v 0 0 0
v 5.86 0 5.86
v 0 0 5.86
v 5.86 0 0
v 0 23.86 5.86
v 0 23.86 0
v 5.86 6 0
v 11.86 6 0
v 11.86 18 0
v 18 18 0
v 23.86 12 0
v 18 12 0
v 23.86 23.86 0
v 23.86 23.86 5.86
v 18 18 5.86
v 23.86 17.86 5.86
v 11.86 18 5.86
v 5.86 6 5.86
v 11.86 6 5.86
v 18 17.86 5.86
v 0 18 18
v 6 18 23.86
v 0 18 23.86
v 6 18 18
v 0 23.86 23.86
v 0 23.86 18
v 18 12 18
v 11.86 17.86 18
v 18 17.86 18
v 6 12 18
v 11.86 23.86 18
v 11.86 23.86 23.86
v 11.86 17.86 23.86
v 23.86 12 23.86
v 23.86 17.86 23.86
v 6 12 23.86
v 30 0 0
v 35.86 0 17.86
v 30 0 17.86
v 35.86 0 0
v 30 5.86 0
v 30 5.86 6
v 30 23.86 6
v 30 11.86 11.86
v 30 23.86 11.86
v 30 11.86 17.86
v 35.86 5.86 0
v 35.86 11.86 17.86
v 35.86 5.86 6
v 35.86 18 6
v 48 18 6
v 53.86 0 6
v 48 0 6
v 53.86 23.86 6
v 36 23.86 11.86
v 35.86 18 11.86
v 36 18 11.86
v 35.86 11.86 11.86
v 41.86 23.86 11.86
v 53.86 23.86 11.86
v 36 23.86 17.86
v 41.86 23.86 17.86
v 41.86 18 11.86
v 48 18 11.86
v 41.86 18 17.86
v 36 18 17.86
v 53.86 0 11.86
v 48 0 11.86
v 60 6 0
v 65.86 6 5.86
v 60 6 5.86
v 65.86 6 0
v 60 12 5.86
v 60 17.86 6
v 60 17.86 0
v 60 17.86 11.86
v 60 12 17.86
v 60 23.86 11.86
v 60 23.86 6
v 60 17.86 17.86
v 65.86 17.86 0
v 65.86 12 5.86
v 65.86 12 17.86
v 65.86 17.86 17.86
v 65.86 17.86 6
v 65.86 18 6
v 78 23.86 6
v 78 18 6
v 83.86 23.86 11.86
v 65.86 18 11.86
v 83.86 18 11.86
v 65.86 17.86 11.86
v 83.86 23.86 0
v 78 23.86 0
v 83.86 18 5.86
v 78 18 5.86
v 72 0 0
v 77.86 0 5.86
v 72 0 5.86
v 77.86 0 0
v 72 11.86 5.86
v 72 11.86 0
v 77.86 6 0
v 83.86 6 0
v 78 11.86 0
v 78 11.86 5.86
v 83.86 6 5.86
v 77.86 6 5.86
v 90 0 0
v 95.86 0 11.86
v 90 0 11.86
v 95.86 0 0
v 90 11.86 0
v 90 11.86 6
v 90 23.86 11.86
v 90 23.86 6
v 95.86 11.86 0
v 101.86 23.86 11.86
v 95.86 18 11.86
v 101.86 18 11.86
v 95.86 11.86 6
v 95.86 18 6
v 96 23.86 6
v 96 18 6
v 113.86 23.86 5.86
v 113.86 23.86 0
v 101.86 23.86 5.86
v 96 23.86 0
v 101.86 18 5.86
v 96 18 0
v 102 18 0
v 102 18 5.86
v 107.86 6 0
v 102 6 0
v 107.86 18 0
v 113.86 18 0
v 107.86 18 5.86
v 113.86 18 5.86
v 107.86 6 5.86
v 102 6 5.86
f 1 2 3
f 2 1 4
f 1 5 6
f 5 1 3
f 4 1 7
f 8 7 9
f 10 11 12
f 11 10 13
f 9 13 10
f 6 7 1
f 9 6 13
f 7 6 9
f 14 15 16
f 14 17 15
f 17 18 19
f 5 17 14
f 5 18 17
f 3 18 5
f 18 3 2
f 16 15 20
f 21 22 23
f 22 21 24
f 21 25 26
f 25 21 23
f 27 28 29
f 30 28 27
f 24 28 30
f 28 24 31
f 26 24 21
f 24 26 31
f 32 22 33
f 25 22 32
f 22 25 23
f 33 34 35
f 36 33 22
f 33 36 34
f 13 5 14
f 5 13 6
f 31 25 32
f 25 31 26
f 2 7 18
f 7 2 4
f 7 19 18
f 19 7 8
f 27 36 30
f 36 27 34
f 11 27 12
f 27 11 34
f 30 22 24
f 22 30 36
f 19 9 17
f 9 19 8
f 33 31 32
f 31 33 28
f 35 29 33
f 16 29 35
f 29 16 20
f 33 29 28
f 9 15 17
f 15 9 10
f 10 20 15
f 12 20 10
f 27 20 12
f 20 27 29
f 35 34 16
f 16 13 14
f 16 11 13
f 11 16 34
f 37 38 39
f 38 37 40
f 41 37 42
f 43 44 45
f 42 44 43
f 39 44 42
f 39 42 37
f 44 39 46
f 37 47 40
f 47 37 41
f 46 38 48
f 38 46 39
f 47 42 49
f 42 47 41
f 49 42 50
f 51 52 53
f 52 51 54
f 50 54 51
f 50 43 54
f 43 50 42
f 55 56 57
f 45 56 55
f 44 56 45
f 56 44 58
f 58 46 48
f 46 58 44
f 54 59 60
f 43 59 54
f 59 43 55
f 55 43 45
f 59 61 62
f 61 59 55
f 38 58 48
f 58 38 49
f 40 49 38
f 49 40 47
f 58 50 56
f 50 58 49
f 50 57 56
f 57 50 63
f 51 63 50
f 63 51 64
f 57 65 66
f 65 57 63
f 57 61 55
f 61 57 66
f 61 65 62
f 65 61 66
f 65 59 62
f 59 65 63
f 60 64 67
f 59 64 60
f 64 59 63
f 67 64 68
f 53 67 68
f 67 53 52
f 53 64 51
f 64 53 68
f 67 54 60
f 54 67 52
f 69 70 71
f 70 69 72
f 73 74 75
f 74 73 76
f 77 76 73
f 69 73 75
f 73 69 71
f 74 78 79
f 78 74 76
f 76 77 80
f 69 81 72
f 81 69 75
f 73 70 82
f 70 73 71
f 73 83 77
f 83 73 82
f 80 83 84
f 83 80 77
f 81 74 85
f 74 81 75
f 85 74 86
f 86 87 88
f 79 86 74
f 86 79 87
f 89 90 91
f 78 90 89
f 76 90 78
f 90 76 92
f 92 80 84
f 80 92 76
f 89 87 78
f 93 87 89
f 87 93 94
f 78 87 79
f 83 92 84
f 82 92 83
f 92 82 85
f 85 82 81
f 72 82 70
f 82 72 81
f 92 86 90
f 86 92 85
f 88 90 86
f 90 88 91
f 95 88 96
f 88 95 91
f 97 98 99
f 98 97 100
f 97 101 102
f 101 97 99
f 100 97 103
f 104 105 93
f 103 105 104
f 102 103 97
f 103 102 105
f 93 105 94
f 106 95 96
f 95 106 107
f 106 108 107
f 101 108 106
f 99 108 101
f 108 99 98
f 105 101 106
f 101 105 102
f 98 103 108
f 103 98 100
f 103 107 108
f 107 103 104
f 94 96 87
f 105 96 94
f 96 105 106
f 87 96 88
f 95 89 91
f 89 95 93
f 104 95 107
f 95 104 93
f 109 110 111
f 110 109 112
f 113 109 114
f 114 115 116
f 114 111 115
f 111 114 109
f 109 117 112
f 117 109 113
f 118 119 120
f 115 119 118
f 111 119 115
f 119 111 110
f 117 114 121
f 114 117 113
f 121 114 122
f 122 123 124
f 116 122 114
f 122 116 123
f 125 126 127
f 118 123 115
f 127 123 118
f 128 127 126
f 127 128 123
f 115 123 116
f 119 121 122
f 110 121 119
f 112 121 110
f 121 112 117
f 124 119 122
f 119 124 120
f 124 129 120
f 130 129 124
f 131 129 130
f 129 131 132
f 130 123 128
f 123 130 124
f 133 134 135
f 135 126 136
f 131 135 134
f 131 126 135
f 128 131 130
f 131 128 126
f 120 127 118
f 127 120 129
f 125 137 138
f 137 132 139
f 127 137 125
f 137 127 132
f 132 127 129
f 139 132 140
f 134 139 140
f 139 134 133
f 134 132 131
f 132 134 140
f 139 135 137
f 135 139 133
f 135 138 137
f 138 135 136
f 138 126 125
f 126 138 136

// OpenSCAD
// file: ../common.scad
// Flattens one level of nested lists
function flatten_list(lst) = [ for (item = lst) each item ];

// Takes a puzzlecad string representation of a puzzle piece, returns the size
// along the X axis.
function sizeX(piece) =
    max([for (layer = piece) each len(search("|", layer, 0)[0]) + 1]);

// Takes an array of pieces in puzzle cad notation, then sorts them in
// decreasing order of their size along the X axis. Because puzzlecad's
// positioning is based on the order of the arry passed to the burr_plate
// function, this would compact rows of the same height, unless
// $auto_layout=true because then the auto orienting will make the value
// returned by sizeX() not match the actual X axis of the piece.
function sortX(pieces) = !(len(pieces)>0) ? [] : let(
    pivot   = pieces[floor(len(pieces)/2)],
    lesser  = [ for (y = pieces) if (sizeX(y)  < sizeX(pivot)) y ],
    equal   = [ for (y = pieces) if (sizeX(y) == sizeX(pivot)) y ],
    greater = [ for (y = pieces) if (sizeX(y)  > sizeX(pivot)) y ]
) concat(
    sortX(greater), equal, sortX(lesser)
);

// This is a placement function used by puzzle_plate() I intended to make more
// transformations like sortX(), but that wasn't very useful in the end. Maybe
// remove this?.
function place(pieces) = flatten_list(pieces);

// This module creates all puzzle pieces. It expects an array of pieces where
// each piece is itself an array of either one or two arrays, the first one is
// the piece without any connectors and the second one is a dissected piece
// ready for printing. If $auto_layout=true this prints all pieces in their
// connector version, otherwise it renders the full pieces (probably
// unprintaple withoput supports).
module puzzle_plate(puzzle, next_joint_letter=0) {
    if (!$auto_layout) {
        burr_plate([for (piece = puzzle) piece[0]]);
    } else {
        burr_plate(place([for (piece = puzzle) len(piece) == 2 ? piece[1] : [piece[0]]]));
    }
}

// Given a puzzle in the same format used for puzzle_plate() and a piece index,
// this renders the piece both in the full form and dissected one. It's useful
// to debug and check that the dissection is correct and actually assembles to
// the intended piece.
module debug_piece(puzzle, piece) {
    burr_plate([puzzle[piece][0]], $auto_layout = false);
    
    translate([0, $burr_scale*(sizeX(puzzle[piece][0]) + 1), 0])
    if (len(puzzle[piece]) > 1) {
        burr_plate(puzzle[piece][1], $auto_layout = true);
    } else {
        burr_plate([puzzle[piece][0]], $auto_layout = true);
    }
}
// main file
include <puzzlecad.scad>
include <../common.scad>


$burr_scale = 6;
$plate_width = 143;
$plate_depth = 89;
$burr_inset = 0.07;
$burr_bevel = 0;
$auto_layout = true;

puzzle = [
    //A
    [
        ["x...|xx..|xx.x|xxxx","....|....|...x","....|....|...x","....|....|.xxx|xx"]
    ],
    
    //B
    [
        ["x...|....|....|....","x..x|x..x|x..x|xxxx", "x...|x...|....|.x.."]
    ],
    
    //C
    [
        ["..x.|x.xx|x..x|...x","....|....|x...|xxxx","....|....|x...."]
    ],
    
    //D
    [
        ["x...|x.x.|..x.|.xxx","x...|x...|x...|xx.."]
    ]
];

puzzle_plate(puzzle);

*debug_piece(puzzle, 3);
